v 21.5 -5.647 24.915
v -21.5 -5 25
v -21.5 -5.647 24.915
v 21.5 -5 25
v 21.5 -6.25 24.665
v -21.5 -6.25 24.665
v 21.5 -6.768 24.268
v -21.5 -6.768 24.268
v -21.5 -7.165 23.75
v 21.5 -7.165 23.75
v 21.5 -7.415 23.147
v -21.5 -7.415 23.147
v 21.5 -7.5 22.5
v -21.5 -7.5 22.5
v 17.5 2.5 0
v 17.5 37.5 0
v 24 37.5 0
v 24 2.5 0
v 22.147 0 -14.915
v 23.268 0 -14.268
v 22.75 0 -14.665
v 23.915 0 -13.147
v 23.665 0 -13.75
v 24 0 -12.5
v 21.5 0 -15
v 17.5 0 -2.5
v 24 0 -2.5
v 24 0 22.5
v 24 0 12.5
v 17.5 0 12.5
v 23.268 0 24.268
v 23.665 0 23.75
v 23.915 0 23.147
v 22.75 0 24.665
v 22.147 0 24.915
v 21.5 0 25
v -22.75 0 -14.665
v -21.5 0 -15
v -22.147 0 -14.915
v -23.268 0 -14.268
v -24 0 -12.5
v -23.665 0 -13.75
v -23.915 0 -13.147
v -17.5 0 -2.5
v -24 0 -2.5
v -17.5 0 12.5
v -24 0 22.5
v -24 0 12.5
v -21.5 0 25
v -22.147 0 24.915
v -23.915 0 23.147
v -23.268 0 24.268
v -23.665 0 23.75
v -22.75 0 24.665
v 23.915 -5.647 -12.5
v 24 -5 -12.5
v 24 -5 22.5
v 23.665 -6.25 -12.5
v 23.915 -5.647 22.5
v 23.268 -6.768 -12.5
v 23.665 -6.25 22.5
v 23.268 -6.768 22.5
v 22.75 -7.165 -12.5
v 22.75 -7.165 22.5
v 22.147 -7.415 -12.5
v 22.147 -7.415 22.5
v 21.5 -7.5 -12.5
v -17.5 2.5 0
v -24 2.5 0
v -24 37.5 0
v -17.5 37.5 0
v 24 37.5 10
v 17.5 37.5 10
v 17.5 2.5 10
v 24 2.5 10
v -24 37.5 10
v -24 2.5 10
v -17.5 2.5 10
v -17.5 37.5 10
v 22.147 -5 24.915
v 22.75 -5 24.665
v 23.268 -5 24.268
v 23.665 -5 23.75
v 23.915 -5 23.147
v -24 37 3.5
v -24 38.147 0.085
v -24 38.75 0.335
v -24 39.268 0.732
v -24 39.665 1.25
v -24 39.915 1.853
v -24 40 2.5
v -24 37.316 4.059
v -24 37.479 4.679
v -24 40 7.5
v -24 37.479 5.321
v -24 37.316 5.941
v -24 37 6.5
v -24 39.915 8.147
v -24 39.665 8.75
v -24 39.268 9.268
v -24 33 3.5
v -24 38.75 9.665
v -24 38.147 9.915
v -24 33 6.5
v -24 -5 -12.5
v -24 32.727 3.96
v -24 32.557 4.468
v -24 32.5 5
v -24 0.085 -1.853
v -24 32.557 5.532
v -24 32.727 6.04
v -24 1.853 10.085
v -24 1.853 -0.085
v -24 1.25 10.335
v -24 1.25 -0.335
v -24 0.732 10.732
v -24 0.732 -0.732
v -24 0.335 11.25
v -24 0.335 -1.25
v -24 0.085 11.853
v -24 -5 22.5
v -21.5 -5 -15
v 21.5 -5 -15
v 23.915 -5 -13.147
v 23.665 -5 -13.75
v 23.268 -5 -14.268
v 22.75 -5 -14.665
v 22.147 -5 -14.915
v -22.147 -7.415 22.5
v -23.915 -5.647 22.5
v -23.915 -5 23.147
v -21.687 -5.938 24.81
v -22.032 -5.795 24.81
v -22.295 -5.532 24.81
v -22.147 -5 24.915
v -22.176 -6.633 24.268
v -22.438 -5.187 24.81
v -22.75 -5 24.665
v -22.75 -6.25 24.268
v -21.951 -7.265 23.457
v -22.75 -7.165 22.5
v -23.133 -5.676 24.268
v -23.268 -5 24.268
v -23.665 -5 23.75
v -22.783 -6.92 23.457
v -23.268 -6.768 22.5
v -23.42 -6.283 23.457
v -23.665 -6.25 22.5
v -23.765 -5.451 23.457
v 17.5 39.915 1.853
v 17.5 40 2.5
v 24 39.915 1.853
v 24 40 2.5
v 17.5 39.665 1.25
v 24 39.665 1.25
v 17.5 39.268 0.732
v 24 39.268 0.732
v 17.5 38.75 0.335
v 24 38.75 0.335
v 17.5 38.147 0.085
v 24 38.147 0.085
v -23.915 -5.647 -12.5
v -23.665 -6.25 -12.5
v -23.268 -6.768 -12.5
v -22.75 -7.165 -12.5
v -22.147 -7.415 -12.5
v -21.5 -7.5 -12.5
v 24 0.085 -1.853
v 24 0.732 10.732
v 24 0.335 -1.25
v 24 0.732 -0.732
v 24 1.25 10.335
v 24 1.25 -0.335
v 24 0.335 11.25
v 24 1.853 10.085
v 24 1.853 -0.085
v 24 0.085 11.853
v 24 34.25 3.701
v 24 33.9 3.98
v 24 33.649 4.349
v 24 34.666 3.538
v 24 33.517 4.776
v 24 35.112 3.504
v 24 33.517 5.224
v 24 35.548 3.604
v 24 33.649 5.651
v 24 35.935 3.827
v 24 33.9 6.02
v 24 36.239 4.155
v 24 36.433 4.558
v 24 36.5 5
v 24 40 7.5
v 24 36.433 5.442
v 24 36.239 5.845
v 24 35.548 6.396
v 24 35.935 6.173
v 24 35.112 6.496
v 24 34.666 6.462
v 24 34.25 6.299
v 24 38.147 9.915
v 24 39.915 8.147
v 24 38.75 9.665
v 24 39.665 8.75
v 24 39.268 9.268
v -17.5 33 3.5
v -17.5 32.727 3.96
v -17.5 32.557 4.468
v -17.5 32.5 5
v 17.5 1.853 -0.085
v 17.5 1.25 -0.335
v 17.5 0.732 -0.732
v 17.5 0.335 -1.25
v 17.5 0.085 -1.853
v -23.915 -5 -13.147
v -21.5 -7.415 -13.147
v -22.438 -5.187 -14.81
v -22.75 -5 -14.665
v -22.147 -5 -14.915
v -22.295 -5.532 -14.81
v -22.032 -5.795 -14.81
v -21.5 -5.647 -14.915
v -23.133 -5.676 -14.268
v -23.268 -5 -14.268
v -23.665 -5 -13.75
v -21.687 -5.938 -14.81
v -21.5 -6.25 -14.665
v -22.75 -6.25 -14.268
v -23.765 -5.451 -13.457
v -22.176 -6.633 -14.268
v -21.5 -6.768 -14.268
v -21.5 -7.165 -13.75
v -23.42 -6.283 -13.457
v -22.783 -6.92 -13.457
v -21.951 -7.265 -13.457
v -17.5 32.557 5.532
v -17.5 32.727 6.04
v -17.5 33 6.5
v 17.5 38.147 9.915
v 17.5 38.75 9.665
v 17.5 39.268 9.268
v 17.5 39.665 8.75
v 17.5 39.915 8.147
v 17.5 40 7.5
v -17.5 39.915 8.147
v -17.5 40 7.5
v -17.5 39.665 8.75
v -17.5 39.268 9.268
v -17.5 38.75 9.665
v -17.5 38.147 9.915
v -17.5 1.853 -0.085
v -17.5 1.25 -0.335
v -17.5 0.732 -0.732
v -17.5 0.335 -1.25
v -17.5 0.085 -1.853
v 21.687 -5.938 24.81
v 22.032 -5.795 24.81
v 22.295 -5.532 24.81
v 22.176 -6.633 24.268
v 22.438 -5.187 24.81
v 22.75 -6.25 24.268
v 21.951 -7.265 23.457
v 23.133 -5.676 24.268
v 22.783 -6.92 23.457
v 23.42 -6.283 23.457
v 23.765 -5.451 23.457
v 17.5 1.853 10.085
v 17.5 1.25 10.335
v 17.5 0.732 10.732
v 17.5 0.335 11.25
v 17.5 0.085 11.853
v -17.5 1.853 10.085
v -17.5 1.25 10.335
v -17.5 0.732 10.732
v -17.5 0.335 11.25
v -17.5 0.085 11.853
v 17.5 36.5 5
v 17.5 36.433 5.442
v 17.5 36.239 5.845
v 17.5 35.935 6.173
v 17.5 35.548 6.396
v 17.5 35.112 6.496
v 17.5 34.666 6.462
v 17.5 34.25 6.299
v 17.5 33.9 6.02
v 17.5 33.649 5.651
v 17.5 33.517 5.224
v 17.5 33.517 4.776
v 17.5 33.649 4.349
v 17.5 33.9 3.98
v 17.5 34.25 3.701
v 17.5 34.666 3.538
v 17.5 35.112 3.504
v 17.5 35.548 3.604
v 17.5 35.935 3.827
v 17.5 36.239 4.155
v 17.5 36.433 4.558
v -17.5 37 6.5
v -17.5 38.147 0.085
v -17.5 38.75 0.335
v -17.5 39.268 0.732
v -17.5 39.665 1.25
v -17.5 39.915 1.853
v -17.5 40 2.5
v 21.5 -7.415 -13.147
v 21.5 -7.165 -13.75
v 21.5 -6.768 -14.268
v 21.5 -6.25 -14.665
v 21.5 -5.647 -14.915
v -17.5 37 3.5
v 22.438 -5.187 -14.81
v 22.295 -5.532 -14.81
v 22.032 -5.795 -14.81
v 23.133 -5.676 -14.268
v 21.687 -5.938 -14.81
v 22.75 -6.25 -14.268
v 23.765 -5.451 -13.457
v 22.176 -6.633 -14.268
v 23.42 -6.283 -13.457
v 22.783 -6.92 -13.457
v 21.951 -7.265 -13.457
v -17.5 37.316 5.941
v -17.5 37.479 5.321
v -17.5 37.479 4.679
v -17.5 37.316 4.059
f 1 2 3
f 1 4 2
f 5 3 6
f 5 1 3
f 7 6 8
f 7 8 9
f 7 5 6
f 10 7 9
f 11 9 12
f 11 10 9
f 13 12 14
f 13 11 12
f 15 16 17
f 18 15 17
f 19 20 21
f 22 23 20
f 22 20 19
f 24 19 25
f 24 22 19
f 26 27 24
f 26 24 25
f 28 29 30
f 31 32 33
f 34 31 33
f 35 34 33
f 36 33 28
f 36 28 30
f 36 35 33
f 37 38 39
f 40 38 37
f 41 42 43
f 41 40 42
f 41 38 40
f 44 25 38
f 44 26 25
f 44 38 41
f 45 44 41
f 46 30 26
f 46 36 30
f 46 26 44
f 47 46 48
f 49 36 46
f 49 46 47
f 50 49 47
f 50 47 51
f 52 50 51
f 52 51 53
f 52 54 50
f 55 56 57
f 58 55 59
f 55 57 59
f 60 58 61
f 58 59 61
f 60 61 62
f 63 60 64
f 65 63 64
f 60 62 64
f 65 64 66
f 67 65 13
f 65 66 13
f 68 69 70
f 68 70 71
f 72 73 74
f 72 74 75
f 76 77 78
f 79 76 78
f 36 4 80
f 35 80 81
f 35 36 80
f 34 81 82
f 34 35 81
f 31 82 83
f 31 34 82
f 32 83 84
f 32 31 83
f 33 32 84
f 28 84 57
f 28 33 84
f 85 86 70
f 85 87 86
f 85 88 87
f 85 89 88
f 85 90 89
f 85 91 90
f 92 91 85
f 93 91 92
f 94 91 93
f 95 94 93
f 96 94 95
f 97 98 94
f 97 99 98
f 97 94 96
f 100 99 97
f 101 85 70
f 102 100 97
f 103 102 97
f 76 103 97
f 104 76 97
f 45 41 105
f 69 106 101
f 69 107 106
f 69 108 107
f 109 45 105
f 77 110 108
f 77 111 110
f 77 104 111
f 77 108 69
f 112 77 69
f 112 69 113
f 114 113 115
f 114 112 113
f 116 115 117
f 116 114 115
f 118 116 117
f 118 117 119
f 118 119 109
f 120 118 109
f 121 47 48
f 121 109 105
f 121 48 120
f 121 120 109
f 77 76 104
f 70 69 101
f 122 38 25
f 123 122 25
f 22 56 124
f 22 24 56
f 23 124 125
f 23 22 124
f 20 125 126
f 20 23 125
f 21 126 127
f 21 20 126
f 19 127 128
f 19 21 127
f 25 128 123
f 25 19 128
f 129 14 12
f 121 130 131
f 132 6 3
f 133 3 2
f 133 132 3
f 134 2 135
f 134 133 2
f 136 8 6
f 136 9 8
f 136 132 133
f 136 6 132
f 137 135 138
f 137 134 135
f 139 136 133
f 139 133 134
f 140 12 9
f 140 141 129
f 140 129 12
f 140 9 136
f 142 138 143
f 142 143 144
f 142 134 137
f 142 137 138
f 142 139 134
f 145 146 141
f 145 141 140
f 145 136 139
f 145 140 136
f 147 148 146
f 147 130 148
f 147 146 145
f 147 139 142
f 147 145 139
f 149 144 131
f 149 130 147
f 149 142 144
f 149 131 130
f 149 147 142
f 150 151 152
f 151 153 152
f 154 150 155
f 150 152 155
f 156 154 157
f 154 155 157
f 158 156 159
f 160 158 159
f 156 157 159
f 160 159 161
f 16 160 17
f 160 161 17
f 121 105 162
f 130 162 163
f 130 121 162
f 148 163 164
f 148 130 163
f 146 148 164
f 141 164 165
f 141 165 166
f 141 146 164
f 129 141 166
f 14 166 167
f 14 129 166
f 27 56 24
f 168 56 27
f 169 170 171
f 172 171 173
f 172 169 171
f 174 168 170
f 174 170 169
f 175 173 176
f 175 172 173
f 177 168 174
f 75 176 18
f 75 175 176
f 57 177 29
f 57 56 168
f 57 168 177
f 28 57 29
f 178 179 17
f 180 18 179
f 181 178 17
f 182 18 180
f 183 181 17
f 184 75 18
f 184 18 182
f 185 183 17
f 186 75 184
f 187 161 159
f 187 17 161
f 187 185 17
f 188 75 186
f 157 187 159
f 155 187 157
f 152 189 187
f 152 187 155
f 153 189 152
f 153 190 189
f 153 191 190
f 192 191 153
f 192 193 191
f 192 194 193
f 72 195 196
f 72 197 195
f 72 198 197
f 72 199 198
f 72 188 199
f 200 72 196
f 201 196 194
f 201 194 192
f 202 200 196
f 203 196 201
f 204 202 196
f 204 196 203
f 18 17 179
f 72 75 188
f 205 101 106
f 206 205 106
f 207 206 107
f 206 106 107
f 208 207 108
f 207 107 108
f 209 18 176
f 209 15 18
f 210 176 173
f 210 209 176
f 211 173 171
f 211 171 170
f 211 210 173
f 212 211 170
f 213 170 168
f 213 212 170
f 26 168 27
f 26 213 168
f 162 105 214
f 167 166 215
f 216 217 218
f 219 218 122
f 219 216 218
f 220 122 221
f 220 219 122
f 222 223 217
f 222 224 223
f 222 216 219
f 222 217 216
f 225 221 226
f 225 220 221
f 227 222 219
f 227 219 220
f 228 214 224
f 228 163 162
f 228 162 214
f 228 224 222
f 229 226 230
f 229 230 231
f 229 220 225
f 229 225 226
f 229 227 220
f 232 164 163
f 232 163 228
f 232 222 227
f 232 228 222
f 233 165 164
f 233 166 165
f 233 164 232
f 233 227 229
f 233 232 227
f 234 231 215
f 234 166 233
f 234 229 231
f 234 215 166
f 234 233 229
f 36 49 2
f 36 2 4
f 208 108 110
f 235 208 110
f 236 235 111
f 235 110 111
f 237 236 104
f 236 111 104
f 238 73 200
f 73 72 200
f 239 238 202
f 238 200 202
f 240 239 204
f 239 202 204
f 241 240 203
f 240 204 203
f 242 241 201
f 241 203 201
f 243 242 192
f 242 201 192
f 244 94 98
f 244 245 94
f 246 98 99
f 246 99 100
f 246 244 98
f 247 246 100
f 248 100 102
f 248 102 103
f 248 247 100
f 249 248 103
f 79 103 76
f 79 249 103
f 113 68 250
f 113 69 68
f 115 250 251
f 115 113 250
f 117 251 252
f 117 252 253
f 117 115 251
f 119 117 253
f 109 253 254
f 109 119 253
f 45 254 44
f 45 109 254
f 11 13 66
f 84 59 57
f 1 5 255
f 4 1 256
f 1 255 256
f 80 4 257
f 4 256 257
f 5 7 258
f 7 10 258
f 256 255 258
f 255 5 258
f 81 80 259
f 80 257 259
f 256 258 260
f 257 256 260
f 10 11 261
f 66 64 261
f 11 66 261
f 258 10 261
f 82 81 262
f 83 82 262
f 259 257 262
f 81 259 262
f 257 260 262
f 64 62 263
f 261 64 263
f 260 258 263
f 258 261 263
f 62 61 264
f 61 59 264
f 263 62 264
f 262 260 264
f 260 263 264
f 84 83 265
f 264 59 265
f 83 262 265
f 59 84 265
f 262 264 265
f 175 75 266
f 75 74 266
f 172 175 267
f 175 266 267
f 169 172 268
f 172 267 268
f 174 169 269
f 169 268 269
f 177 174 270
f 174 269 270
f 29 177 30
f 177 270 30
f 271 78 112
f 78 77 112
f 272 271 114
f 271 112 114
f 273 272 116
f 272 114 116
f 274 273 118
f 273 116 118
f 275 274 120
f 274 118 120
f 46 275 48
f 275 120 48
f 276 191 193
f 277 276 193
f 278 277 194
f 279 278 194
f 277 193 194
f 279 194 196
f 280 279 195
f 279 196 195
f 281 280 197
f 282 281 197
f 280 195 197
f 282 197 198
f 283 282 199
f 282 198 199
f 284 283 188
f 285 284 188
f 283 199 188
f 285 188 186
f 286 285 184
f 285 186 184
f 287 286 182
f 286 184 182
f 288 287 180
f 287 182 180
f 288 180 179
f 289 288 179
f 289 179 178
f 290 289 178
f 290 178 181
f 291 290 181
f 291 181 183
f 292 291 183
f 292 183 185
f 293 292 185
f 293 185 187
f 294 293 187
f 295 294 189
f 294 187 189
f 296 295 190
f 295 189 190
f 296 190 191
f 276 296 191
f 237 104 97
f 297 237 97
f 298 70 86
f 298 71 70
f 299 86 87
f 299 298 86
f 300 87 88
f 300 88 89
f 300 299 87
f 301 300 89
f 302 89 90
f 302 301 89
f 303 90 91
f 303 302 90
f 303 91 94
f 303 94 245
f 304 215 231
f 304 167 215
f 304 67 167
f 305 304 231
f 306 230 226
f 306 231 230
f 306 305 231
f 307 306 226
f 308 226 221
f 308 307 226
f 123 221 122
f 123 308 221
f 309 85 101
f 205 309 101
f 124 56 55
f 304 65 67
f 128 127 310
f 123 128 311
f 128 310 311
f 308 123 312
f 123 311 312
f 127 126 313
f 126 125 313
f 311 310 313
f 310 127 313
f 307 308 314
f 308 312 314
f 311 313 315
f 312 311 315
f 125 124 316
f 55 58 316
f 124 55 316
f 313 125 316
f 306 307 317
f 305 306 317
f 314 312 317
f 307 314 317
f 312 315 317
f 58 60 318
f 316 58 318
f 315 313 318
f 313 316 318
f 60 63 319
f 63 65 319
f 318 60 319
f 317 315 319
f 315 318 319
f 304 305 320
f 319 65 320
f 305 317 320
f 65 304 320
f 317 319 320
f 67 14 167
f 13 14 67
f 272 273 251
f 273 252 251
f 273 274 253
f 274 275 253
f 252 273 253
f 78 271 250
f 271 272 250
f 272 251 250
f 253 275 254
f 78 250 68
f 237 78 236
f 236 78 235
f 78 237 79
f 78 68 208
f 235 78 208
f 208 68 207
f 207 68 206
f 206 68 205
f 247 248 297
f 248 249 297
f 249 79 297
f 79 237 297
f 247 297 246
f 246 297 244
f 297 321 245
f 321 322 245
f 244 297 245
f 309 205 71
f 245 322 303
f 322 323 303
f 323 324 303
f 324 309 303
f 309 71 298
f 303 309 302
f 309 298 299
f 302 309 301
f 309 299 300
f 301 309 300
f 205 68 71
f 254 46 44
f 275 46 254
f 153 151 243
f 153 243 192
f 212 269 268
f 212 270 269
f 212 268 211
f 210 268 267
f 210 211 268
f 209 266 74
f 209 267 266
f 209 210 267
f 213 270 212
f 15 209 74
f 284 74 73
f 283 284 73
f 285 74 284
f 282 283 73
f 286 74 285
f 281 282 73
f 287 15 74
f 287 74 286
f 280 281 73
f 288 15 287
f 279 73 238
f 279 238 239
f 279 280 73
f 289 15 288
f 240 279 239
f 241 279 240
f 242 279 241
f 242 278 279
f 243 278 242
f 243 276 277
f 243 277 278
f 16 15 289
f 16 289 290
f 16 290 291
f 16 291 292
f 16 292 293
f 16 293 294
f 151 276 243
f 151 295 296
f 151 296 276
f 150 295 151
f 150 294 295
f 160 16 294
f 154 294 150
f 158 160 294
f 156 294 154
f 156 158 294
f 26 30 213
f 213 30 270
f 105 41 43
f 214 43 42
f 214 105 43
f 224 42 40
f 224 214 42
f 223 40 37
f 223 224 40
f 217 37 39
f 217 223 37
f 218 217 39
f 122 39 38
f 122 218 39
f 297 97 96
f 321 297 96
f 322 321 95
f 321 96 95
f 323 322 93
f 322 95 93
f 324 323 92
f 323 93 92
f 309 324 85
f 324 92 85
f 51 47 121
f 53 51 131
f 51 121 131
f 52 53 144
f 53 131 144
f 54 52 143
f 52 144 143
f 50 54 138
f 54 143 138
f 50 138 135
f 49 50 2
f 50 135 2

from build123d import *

# Parameters (mm, degrees)
F0_W     = 6.5
F0_H     = 40
F1_DEPTH = 10
F4_DEPTH = 6.5
F2_R     = 1.5
F5_DEPTH = 6.5
F7_DEPTH = 15
F8_DEPTH = 15
F9_R     = 2.5


# Not quite as in the source:
# - a feature names something its author has since deleted; it is built from what else it names


with BuildPart() as f1:
    # F0 (on Top) → F1 (new body)
    with BuildSketch(Plane.XY):
        with Locations((-20.75, 20)):
            Rectangle(F0_W, F0_H)
        with Locations((20.75, 20)):
            Rectangle(F0_W, F0_H)
        Polygon((-17.5, 0), (-24, 0), (-24, -7.5), (24, -7.5), (24, 0), (17.5, 0), align=None)
    extrude(amount=F1_DEPTH)

    # F3 (on face) → F4 (cut, through all)
    with BuildSketch(Plane(origin=(-24, 0, 0), x_dir=(0, -1, 0), z_dir=(-1, 0, 0))):
        with BuildLine():
            ThreePointArc((-33, 3.5), (-32.6282917549, 4.209430585), (-32.5, 5))
            ThreePointArc((-32.5, 5), (-32.6282917549, 5.790569415), (-33, 6.5))
            Line((-33, 6.5), (-37, 6.5))
            ThreePointArc((-37, 6.5), (-37.5, 5), (-37, 3.5))
            Line((-37, 3.5), (-33, 3.5))
        make_face()
    extrude(amount=-F4_DEPTH, mode=Mode.SUBTRACT)

    # F2 (on face) → F5 (cut, through all)
    with BuildSketch(Plane.YZ.offset(24)):
        with Locations((35, 5)):
            Circle(F2_R)
    extrude(amount=-F5_DEPTH, mode=Mode.SUBTRACT)

    # F6 (on face) → F7 (join)
    with BuildSketch(Plane.XY.offset(10)):
        Polygon((-17.5, 0), (-24, 0), (-24, -7.5), (24, -7.5), (24, 0), (17.5, 0), align=None)
    extrude(amount=F7_DEPTH)

    # F0 (on Top) → F8 (join)
    with BuildSketch(Plane.XY):
        Polygon((-17.5, 0), (-24, 0), (-24, -7.5), (24, -7.5), (24, 0), (17.5, 0), align=None)
    extrude(amount=-F8_DEPTH)

    # F9
    f9_edges = [f1.edges().sort_by_distance(p)[0] for p in [
        (-24, -7.5, 5),
        (24, -7.5, 5),
        (-20.75, 40, 10),
        (-20.75, 40, 0),
        (20.75, 40, 10),
        (20.75, 40, 0),
        (0, -7.5, 25),
        (24, -3.75, 25),
        (-24, -3.75, 25),
        (-24, -3.75, -15),
        (24, -3.75, -15),
        (0, -7.5, -15),
        (20.75, 0, 10),
        (20.75, 0, 0),
        (-20.75, 0, 10),
        (-20.75, 0, 0),
    ]]
    fillet(f9_edges, radius=F9_R)


solid = f1.part
